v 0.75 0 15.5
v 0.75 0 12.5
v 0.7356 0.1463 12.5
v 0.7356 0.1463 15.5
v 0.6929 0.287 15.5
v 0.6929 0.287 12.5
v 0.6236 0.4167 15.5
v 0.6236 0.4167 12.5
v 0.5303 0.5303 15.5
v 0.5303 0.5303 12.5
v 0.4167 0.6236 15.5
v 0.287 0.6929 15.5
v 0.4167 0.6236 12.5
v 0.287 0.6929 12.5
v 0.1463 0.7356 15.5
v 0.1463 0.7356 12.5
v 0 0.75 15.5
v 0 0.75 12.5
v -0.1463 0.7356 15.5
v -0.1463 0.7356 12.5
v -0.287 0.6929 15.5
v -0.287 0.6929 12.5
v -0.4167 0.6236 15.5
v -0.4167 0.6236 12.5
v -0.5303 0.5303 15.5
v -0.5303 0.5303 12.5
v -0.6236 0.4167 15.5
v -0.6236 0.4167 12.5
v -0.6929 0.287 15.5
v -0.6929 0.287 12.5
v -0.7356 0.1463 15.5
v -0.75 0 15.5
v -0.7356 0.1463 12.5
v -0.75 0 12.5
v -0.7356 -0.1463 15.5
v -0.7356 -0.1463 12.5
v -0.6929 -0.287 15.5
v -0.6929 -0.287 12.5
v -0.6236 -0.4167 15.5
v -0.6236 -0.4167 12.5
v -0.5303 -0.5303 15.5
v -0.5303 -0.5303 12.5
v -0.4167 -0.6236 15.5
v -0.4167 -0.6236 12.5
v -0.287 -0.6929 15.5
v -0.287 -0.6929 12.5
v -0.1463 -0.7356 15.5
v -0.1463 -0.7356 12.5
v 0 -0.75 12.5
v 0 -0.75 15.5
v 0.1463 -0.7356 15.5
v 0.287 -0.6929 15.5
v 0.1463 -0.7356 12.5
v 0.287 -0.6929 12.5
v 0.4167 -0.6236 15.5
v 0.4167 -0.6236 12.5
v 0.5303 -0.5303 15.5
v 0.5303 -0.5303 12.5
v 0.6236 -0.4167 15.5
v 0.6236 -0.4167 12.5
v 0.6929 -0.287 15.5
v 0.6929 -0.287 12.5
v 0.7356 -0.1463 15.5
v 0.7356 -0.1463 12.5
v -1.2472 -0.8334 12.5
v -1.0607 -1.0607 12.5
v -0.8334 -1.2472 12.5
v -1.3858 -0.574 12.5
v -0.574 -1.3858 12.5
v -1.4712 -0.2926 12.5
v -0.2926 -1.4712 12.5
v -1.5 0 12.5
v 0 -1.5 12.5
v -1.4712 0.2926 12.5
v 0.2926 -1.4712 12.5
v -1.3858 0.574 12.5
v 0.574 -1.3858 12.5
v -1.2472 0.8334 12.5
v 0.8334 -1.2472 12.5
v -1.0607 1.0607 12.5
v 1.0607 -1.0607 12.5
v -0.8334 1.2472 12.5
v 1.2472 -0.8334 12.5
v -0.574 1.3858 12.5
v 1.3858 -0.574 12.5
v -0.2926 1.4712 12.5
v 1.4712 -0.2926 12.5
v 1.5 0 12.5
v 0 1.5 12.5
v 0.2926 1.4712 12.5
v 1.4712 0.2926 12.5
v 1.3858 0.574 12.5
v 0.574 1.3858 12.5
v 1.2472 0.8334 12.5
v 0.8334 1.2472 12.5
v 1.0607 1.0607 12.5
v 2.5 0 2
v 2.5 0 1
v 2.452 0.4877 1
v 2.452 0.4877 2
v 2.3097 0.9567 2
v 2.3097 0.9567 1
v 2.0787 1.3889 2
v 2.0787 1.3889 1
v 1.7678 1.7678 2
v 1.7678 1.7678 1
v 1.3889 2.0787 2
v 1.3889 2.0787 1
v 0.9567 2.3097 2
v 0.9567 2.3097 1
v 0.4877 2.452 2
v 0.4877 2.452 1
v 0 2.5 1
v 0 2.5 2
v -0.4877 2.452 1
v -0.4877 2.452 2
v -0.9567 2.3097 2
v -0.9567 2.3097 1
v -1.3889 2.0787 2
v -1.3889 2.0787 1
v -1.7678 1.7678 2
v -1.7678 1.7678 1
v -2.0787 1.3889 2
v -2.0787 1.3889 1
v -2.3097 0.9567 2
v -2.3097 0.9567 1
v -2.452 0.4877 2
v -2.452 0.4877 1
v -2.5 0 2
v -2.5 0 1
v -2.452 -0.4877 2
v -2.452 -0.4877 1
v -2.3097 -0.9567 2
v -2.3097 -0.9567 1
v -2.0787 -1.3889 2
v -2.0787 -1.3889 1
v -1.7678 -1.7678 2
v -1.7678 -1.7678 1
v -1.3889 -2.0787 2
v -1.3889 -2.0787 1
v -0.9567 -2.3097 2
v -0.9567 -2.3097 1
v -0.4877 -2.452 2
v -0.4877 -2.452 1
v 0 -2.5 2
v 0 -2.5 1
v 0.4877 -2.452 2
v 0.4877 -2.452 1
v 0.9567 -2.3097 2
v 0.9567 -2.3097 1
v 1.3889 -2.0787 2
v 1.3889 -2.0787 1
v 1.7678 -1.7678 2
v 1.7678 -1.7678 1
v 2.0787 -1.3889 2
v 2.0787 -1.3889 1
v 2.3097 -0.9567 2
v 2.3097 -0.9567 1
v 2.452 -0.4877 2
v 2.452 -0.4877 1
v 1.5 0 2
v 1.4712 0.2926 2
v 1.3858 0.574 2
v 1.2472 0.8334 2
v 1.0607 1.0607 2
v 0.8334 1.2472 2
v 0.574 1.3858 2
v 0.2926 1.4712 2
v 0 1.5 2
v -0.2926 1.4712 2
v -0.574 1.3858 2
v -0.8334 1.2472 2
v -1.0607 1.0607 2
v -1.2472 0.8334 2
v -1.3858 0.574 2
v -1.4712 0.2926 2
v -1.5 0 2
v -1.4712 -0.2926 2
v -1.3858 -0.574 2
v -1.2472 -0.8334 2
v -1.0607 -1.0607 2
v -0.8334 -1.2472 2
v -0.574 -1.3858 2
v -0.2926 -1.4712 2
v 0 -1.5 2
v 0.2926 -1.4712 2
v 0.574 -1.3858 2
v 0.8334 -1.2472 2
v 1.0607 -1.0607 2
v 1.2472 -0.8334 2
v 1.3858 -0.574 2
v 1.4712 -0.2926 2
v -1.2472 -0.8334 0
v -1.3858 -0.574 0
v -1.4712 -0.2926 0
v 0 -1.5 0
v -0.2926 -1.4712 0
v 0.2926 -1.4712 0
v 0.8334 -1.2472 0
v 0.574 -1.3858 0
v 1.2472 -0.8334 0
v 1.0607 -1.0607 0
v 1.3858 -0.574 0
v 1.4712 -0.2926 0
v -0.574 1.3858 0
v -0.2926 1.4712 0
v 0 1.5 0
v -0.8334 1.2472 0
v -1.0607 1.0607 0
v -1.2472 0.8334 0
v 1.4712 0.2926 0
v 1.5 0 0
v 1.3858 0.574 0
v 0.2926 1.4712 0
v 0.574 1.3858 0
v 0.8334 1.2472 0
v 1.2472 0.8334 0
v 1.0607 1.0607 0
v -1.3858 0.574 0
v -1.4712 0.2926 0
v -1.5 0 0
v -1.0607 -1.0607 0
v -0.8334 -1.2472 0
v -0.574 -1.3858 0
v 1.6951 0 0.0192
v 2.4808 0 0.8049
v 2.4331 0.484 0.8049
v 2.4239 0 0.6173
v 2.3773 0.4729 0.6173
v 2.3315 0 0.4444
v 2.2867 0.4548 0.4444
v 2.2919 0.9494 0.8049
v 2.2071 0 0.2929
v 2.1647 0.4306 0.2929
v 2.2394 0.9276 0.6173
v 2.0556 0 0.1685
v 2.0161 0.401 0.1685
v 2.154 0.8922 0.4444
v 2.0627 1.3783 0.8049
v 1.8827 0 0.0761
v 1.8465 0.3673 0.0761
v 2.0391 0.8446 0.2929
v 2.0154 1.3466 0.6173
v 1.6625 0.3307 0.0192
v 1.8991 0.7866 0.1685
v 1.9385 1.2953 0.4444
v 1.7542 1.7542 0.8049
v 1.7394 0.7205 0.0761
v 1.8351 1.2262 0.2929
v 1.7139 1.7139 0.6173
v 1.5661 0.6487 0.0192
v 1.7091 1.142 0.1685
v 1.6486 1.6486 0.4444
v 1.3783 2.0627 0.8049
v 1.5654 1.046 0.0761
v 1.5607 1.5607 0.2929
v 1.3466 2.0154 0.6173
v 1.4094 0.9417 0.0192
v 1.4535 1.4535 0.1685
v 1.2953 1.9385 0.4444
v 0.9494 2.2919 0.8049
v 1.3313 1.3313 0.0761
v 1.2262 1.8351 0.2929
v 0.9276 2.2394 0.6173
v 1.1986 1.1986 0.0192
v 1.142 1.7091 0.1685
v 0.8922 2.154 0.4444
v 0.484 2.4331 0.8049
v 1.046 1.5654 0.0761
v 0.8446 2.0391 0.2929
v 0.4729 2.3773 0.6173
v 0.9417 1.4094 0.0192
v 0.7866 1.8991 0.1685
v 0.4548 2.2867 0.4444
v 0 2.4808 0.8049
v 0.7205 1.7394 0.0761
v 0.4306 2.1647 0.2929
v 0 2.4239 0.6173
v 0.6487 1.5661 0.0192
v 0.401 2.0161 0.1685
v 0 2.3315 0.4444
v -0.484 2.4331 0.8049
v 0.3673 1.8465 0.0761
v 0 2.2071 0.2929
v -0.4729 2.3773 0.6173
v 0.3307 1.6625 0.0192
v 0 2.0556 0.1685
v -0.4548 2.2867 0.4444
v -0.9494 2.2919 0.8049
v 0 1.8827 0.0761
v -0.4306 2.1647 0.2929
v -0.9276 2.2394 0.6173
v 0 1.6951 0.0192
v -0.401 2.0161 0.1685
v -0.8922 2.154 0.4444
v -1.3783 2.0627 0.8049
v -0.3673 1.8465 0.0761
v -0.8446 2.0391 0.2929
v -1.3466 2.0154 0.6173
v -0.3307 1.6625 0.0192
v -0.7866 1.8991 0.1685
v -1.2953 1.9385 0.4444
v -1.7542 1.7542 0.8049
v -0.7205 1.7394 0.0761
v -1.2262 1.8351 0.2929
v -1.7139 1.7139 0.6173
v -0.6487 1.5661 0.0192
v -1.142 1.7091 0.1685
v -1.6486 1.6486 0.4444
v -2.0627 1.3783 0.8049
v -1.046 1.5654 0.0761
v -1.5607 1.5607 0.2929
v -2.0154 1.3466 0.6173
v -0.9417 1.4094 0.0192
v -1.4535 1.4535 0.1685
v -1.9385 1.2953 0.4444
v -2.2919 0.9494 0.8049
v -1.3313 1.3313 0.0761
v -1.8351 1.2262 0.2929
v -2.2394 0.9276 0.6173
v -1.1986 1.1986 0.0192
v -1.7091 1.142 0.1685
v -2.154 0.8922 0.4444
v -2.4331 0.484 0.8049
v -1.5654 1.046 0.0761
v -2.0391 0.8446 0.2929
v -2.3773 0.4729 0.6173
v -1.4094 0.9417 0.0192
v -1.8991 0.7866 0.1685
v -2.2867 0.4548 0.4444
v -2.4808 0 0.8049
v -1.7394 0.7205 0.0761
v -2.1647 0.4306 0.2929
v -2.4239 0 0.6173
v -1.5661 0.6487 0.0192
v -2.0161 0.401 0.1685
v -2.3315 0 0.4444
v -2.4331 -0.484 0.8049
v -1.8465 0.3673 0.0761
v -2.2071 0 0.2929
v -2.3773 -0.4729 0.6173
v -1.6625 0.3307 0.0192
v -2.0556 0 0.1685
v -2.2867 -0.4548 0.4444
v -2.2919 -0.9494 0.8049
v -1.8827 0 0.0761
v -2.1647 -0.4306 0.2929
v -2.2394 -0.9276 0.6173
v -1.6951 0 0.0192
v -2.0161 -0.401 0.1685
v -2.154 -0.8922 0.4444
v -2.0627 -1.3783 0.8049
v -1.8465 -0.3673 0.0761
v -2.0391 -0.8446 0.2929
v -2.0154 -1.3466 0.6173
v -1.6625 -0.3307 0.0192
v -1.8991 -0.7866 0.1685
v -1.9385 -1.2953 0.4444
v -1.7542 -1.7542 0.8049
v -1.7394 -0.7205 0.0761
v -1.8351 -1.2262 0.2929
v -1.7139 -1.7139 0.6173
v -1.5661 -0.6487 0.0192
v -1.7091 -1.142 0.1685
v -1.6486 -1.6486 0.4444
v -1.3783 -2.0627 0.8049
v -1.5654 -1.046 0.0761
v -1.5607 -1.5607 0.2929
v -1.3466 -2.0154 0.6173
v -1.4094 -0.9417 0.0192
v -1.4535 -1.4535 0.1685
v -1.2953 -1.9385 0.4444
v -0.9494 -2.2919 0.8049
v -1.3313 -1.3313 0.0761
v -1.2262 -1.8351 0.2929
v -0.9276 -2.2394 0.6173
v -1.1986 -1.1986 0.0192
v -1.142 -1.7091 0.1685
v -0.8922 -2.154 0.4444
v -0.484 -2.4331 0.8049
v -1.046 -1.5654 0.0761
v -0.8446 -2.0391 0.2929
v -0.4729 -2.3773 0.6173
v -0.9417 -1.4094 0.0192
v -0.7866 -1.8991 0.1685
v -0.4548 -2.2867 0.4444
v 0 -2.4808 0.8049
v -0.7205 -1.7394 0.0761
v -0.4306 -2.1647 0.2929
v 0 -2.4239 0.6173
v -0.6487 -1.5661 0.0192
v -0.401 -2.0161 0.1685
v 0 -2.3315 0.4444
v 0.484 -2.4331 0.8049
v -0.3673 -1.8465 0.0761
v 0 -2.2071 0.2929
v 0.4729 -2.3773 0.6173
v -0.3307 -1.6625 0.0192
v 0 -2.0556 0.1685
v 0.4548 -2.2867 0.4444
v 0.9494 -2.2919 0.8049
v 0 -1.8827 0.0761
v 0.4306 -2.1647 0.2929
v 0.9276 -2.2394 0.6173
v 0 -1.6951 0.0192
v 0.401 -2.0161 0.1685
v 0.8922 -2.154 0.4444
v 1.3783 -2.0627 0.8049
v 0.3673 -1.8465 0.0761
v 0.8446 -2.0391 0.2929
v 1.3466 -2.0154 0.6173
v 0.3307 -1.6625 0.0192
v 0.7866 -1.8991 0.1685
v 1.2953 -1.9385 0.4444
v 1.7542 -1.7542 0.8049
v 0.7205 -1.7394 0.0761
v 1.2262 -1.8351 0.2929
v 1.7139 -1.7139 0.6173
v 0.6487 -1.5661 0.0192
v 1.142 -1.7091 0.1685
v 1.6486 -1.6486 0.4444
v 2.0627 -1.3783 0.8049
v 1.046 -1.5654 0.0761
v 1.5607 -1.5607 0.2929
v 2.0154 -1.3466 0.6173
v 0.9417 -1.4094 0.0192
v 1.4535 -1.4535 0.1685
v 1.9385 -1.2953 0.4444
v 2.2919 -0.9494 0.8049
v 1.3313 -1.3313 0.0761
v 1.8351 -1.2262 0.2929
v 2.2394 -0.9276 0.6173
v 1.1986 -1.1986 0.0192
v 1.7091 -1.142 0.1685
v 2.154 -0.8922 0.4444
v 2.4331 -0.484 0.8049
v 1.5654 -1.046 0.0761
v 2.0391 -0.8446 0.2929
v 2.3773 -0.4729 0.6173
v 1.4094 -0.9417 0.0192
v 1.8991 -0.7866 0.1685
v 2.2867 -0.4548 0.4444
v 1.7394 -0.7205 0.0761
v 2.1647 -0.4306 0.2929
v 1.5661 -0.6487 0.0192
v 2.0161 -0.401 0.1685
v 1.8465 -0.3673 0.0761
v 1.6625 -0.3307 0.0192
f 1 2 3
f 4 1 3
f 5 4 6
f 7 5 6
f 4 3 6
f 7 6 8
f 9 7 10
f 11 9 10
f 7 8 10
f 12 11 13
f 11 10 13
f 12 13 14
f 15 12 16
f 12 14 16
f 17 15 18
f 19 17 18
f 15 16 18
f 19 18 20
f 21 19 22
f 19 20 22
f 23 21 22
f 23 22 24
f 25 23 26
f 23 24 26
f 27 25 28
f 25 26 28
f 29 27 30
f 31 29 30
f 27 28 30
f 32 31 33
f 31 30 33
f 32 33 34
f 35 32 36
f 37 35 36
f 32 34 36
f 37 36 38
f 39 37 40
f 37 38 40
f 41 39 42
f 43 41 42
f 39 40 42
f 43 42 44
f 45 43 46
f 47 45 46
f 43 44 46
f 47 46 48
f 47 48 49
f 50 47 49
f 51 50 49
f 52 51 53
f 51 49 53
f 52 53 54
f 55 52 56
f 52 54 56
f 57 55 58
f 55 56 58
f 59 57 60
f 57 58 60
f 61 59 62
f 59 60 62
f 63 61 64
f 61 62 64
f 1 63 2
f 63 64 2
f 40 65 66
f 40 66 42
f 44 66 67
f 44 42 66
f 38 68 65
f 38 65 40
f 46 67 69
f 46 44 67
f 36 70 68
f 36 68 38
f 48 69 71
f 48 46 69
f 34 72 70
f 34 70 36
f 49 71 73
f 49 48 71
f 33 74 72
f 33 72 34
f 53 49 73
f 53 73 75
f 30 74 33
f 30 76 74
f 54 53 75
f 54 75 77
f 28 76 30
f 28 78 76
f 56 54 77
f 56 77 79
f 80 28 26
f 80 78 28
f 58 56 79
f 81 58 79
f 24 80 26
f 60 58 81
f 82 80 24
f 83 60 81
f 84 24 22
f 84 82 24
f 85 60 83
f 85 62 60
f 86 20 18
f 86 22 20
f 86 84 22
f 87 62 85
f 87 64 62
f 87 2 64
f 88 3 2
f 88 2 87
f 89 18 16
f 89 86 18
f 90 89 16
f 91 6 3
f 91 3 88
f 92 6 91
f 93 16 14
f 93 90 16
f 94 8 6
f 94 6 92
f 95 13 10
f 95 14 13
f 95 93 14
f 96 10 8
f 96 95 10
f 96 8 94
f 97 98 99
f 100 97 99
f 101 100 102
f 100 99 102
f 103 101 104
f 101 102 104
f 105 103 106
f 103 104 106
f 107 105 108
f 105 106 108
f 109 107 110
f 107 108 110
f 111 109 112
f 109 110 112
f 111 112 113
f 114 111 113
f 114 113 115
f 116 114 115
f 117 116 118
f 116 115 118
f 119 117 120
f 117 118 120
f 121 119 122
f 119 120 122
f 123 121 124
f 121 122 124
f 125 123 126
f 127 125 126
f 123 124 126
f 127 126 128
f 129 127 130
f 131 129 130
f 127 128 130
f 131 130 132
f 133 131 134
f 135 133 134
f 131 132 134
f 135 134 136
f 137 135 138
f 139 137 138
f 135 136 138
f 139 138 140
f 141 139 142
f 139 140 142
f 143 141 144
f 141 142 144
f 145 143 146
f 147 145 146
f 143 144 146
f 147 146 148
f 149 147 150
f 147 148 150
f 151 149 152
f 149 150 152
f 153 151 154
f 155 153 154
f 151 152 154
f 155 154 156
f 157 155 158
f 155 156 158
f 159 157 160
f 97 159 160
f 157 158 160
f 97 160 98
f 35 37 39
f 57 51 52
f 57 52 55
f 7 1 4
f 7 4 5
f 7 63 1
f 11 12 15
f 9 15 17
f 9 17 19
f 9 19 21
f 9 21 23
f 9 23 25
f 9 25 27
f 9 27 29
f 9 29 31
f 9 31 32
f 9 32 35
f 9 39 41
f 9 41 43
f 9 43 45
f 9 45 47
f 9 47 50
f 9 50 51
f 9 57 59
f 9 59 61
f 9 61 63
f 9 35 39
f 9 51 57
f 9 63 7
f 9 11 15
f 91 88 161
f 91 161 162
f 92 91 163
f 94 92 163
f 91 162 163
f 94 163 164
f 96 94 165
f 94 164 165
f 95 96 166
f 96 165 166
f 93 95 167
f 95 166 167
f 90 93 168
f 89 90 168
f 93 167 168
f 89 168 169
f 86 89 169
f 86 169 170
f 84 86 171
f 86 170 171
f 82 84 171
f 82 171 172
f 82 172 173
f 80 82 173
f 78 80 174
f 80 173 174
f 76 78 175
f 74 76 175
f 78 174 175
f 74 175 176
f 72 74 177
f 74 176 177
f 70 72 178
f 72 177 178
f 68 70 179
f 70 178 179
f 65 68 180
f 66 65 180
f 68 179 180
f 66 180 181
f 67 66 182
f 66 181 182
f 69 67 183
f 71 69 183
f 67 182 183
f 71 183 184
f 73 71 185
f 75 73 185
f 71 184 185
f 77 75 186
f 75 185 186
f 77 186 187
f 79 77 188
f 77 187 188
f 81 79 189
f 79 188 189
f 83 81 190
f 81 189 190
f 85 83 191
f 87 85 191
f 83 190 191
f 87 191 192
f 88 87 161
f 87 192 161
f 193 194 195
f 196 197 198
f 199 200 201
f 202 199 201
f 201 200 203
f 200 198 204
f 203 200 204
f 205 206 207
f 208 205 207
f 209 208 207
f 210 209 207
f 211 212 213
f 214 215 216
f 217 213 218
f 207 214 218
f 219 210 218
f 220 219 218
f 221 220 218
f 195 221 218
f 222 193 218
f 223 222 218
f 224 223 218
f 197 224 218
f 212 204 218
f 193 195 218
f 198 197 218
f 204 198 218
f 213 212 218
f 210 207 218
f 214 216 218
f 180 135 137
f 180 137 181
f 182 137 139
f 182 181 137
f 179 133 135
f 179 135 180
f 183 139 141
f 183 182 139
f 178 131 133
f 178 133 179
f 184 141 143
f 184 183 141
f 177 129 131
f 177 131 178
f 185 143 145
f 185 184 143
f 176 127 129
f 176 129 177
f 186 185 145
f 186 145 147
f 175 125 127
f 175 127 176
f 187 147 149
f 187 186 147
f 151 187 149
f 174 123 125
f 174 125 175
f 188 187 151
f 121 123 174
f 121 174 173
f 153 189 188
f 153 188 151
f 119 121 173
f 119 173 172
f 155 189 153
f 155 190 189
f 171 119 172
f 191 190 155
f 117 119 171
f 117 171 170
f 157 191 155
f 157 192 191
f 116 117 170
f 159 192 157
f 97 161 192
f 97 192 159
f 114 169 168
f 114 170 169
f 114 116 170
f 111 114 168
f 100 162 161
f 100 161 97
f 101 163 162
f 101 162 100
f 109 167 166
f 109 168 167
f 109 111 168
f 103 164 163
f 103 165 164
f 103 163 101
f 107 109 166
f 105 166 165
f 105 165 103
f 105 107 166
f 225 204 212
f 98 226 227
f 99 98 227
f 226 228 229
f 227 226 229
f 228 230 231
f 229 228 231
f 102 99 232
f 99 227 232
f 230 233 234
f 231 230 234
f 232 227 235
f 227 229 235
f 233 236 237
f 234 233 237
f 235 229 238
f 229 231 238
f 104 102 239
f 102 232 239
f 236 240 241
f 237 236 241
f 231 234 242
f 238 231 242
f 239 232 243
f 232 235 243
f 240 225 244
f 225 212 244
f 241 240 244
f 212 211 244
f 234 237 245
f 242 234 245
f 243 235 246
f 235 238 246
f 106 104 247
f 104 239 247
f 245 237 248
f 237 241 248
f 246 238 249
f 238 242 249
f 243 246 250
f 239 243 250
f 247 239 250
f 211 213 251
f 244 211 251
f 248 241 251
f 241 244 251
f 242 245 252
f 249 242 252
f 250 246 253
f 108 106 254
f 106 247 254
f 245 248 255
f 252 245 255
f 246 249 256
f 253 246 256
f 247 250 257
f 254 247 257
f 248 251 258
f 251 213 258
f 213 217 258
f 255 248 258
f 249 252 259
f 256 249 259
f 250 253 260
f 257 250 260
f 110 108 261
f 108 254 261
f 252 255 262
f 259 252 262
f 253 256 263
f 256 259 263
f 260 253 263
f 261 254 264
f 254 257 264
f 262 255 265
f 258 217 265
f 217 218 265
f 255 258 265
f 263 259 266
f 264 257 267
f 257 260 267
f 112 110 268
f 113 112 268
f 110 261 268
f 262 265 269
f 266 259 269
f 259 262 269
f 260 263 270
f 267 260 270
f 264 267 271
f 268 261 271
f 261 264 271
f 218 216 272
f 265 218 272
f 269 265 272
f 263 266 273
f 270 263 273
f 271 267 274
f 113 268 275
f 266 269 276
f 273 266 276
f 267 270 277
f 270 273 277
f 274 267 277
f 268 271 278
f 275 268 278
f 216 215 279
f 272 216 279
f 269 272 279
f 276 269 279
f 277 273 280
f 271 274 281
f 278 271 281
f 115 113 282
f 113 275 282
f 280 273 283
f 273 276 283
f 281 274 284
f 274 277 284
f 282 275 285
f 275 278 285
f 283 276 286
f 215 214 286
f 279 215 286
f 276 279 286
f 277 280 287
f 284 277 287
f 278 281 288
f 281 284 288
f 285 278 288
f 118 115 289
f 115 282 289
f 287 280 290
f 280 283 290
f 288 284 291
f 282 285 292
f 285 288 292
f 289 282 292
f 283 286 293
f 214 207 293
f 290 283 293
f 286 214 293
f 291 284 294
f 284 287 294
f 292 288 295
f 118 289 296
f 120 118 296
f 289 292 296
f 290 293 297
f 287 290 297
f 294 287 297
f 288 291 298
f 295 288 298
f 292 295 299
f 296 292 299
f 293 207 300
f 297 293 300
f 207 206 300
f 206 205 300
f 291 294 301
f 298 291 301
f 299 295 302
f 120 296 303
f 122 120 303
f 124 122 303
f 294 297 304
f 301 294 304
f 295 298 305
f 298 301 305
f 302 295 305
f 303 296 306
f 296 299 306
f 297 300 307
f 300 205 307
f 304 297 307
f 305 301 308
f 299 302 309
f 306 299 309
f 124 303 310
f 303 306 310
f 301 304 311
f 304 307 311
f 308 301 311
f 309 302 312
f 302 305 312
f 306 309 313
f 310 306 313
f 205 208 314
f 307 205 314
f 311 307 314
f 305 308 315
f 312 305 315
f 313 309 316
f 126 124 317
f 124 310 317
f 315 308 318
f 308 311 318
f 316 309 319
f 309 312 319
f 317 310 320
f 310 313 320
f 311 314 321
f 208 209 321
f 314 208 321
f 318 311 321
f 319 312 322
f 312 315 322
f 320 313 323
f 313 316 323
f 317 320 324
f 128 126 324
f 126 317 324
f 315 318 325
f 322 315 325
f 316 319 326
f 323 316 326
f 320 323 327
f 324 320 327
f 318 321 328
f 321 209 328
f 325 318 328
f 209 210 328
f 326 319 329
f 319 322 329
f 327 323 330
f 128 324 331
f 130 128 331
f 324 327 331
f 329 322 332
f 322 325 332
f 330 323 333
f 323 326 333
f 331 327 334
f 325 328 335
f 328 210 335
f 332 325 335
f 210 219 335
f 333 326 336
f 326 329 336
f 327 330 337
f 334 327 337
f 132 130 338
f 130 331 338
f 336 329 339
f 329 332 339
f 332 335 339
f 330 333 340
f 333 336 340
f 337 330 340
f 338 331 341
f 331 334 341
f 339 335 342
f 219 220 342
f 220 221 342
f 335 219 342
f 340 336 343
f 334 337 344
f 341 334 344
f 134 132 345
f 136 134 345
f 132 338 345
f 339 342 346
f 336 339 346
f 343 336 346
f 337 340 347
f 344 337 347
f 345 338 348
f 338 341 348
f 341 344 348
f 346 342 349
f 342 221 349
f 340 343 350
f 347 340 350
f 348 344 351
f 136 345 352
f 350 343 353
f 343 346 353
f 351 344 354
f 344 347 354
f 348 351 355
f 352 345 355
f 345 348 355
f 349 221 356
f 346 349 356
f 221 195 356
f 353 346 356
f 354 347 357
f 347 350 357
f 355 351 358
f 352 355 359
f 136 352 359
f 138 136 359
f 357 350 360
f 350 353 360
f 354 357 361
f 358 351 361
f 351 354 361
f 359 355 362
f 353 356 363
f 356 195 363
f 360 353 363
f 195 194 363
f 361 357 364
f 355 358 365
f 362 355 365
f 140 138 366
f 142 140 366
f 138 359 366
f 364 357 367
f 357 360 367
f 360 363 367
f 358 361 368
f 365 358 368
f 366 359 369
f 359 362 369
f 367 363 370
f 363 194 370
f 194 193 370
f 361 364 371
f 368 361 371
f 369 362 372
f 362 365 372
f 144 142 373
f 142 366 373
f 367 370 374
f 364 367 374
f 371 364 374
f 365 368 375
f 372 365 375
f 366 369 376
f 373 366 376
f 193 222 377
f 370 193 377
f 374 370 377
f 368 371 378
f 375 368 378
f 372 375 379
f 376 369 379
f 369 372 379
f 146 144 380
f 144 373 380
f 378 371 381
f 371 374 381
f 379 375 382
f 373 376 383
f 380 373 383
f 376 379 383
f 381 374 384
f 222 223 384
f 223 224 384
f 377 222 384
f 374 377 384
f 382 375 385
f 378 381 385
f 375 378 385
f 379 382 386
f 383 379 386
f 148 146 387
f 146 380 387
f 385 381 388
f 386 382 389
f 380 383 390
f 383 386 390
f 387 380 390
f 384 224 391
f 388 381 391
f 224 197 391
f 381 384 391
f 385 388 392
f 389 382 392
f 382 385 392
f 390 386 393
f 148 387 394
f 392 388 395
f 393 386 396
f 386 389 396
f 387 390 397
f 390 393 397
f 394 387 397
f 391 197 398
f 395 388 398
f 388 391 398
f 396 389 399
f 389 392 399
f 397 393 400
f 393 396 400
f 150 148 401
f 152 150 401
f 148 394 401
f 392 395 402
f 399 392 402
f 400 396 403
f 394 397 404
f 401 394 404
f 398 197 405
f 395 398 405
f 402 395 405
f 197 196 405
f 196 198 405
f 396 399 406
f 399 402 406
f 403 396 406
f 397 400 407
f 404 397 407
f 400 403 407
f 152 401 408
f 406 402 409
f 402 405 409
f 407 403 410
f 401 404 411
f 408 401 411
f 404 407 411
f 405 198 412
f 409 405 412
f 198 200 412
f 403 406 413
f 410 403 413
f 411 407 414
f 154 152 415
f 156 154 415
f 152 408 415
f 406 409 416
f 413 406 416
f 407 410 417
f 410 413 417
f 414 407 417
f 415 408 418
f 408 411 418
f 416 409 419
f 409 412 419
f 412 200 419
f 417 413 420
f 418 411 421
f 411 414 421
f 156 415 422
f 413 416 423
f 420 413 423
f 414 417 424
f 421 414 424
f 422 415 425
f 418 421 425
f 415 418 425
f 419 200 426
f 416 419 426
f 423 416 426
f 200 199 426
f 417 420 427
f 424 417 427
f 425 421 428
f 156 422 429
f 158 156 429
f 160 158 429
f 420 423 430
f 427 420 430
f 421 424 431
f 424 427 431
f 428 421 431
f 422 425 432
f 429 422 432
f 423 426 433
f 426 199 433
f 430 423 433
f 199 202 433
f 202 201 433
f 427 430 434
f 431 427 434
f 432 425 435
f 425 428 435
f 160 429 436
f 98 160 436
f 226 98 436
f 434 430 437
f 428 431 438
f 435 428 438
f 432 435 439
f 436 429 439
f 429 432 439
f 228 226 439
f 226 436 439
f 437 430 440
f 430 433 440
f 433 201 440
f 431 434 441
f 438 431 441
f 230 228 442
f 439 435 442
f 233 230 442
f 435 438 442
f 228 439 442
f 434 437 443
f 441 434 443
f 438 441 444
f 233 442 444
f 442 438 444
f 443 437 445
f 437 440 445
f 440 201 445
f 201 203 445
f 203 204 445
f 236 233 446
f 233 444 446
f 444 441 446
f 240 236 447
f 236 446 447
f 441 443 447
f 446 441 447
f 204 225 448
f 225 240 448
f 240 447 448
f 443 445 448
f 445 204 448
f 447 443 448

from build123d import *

# Parameters (mm, degrees)
SKETCH_R     = 2.5
PAD_DEPTH    = 2
FILLET_R     = 1
SKETCH001_R  = 1.5
PAD001_DEPTH = 10.5
SKETCH002_R  = 0.75
PAD002_DEPTH = 3


with BuildPart() as part:
    # Sketch → Pad (new body)
    with BuildSketch(Plane.XY):
        Circle(SKETCH_R)
    extrude(amount=PAD_DEPTH)

    # Fillet
    fillet_edges = [part.edges().sort_by_distance(p)[0] for p in [
        (-2.5, 0, 0),
    ]]
    fillet(fillet_edges, radius=FILLET_R)

    # Sketch001 (on DatumPlane) → Pad001 (join)
    with BuildSketch(Plane.XY.offset(2)):
        Circle(SKETCH001_R)
    extrude(amount=PAD001_DEPTH)

    # Sketch002 (on DatumPlane) → Pad002 (join)
    with BuildSketch(Plane.XY.offset(12.5)):
        Circle(SKETCH002_R)
    extrude(amount=PAD002_DEPTH)


solid = part.part
